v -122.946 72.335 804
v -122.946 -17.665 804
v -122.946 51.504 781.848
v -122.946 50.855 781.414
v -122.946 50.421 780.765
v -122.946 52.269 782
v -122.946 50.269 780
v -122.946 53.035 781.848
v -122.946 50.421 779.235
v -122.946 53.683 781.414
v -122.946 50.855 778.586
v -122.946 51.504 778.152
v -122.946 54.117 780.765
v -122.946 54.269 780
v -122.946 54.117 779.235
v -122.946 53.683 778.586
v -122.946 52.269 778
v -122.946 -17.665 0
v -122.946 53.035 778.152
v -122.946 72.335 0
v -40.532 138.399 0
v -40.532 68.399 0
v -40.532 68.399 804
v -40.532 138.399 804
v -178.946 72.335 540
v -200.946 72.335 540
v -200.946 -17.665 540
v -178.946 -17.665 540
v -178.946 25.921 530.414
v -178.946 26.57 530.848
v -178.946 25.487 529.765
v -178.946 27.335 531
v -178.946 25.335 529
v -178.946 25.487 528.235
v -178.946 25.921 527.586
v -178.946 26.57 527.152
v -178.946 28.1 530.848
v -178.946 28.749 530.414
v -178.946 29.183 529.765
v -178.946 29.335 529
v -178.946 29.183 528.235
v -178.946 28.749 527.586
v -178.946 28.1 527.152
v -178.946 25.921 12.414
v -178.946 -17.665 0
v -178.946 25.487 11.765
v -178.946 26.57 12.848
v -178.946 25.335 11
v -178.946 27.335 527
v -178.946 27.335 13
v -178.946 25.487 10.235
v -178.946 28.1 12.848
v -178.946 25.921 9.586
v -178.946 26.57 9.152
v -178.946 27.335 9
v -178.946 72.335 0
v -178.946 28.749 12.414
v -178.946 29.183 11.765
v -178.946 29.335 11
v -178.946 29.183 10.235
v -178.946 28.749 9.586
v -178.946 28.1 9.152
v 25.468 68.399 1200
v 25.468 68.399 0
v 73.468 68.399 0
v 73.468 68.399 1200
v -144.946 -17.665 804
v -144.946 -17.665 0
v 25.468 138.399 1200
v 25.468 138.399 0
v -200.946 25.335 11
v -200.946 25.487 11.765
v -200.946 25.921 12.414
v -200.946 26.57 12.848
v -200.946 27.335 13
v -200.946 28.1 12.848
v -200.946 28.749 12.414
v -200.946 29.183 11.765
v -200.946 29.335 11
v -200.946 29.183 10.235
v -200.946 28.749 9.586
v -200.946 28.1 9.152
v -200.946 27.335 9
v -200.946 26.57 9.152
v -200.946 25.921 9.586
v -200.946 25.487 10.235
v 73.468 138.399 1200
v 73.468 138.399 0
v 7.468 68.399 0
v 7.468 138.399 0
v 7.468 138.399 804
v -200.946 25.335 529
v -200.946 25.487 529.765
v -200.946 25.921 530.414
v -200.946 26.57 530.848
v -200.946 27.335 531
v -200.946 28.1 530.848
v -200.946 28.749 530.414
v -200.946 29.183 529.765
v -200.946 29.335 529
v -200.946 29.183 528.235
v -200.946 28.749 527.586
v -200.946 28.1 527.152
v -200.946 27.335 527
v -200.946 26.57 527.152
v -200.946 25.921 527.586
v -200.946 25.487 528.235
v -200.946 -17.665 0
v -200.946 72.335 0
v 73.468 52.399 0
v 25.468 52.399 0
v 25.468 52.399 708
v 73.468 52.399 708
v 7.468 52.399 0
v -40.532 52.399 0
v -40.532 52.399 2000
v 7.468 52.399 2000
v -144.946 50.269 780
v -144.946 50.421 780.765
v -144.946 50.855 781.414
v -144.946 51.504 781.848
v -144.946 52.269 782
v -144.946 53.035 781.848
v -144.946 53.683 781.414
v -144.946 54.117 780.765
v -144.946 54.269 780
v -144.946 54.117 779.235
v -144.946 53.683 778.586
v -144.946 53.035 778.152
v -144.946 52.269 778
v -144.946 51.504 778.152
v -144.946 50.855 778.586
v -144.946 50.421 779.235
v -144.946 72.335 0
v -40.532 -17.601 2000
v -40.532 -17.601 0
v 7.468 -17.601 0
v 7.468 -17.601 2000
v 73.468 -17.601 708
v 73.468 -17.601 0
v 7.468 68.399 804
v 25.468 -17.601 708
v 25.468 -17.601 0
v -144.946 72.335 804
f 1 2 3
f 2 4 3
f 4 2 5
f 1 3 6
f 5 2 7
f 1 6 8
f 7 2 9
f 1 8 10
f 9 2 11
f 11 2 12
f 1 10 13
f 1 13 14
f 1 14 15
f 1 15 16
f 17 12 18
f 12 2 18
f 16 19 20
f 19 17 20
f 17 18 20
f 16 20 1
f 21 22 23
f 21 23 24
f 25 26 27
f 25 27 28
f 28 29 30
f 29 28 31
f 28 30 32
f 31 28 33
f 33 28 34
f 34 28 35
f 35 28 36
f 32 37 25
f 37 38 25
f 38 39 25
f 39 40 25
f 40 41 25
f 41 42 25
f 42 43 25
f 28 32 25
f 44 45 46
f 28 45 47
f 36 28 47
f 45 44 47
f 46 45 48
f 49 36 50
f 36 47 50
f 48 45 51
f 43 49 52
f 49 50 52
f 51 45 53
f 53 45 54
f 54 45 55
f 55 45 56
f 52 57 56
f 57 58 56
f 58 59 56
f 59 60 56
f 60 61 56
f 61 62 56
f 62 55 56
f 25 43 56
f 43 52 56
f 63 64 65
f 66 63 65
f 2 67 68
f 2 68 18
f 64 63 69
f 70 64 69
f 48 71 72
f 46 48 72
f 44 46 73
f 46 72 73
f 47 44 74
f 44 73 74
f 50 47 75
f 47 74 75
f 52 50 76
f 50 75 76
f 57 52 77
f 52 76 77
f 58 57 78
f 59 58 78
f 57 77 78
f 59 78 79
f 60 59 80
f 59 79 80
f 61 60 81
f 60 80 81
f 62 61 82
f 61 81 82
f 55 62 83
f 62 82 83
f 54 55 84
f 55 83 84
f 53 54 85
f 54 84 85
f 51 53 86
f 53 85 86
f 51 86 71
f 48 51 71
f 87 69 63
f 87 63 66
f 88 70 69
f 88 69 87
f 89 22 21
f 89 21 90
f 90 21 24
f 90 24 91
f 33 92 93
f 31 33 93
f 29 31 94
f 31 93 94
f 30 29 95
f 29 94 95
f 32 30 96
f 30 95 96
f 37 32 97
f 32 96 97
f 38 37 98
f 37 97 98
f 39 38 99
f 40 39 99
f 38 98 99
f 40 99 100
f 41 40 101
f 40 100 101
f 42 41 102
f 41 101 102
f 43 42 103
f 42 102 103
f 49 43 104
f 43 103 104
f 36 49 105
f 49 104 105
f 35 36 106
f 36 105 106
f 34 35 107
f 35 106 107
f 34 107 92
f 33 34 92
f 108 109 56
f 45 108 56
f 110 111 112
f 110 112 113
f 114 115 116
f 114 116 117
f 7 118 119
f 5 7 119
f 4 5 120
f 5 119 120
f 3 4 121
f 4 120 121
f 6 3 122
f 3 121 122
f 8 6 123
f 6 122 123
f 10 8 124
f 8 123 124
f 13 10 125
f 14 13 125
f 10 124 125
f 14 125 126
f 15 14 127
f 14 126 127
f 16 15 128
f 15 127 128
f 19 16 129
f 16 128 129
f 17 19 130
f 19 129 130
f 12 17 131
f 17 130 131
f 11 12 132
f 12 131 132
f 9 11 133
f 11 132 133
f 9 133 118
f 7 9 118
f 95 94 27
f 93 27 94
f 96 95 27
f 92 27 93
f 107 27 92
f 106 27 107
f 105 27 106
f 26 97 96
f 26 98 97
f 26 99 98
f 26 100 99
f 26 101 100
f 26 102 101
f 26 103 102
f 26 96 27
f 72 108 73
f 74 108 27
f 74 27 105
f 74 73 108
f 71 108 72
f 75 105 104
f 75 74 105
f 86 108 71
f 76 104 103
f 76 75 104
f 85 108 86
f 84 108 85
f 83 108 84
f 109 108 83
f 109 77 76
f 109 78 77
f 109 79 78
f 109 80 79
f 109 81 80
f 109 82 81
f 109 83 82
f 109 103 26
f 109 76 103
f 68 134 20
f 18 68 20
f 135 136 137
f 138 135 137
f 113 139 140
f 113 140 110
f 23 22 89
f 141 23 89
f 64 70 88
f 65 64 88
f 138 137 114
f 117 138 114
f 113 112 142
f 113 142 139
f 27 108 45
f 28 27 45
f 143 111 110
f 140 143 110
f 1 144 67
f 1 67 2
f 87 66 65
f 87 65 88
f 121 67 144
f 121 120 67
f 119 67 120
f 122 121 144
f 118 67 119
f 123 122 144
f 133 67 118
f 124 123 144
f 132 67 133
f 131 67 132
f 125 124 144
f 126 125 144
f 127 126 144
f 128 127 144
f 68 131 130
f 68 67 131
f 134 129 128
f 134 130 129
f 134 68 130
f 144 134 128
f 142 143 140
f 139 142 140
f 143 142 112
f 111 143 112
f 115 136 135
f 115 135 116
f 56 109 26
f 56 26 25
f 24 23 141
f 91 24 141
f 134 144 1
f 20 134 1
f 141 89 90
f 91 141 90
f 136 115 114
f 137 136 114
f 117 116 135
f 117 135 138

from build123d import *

# Parameters (mm, degrees)
F0_W      = 48
F0_H      = 70
F1_DEPTH  = 2000
F2_DEPTH  = 804
F3_DEPTH  = 1200
F4_DEPTH  = 708
F5_W      = 22
F5_H      = 90
F6_DEPTH  = 804
F7_R      = 2
F8_DEPTH  = 22
F9_DEPTH  = 540
F10_R     = 2
F11_DEPTH = 22


with BuildPart() as f1:
    # F0 (on Top) → F1 (new body)
    with BuildSketch(Plane.XY):
        with Locations((-16.531542, 17.398522)):
            Rectangle(F0_W, F0_H)
    extrude(amount=F1_DEPTH)


with BuildPart() as f2:
    # F0 (on Top) → F2 (new body)
    with BuildSketch(Plane.XY):
        with Locations((-16.531542, 103.398522)):
            Rectangle(F0_W, F0_H)
    extrude(amount=F2_DEPTH)


with BuildPart() as f3:
    # F0 (on Top) → F3 (new body)
    with BuildSketch(Plane.XY):
        with Locations((49.468458, 103.398522)):
            Rectangle(F0_W, F0_H)
    extrude(amount=F3_DEPTH)


with BuildPart() as f4:
    # F0 (on Top) → F4 (new body)
    with BuildSketch(Plane.XY):
        with Locations((49.468458, 17.398522)):
            Rectangle(F0_W, F0_H)
    extrude(amount=F4_DEPTH)


with BuildPart() as f6:
    # F5 (on Top) → F6 (new body)
    with BuildSketch(Plane.XY):
        with Locations((-133.94611, 27.33506)):
            Rectangle(F5_W, F5_H)
    extrude(amount=F6_DEPTH)

    # F7 (on face) → F8 (cut, through all)
    with BuildSketch(Plane(origin=(-144.94611, 0, 0), x_dir=(0, -1, 0), z_dir=(-1, 0, 0))):
        with Locations((-52.26915, 780)):
            Circle(F7_R)
    extrude(amount=-F8_DEPTH, mode=Mode.SUBTRACT)


with BuildPart() as f9:
    # F5 (on Top) → F9 (new body)
    with BuildSketch(Plane.XY):
        with Locations((-189.94611, 27.33506)):
            Rectangle(F5_W, F5_H)
    extrude(amount=F9_DEPTH)

    # F10 (on face) → F11 (cut, through all)
    with BuildSketch(Plane(origin=(-200.94611, 0, 0), x_dir=(0, -1, 0), z_dir=(-1, 0, 0))):
        with Locations((-27.33506, 529)):
            Circle(F10_R)
        with Locations((-27.33506, 11)):
            Circle(F10_R)
    extrude(amount=-F11_DEPTH, mode=Mode.SUBTRACT)


solid = Compound([f1.part, f2.part, f3.part, f4.part, f6.part, f9.part])
